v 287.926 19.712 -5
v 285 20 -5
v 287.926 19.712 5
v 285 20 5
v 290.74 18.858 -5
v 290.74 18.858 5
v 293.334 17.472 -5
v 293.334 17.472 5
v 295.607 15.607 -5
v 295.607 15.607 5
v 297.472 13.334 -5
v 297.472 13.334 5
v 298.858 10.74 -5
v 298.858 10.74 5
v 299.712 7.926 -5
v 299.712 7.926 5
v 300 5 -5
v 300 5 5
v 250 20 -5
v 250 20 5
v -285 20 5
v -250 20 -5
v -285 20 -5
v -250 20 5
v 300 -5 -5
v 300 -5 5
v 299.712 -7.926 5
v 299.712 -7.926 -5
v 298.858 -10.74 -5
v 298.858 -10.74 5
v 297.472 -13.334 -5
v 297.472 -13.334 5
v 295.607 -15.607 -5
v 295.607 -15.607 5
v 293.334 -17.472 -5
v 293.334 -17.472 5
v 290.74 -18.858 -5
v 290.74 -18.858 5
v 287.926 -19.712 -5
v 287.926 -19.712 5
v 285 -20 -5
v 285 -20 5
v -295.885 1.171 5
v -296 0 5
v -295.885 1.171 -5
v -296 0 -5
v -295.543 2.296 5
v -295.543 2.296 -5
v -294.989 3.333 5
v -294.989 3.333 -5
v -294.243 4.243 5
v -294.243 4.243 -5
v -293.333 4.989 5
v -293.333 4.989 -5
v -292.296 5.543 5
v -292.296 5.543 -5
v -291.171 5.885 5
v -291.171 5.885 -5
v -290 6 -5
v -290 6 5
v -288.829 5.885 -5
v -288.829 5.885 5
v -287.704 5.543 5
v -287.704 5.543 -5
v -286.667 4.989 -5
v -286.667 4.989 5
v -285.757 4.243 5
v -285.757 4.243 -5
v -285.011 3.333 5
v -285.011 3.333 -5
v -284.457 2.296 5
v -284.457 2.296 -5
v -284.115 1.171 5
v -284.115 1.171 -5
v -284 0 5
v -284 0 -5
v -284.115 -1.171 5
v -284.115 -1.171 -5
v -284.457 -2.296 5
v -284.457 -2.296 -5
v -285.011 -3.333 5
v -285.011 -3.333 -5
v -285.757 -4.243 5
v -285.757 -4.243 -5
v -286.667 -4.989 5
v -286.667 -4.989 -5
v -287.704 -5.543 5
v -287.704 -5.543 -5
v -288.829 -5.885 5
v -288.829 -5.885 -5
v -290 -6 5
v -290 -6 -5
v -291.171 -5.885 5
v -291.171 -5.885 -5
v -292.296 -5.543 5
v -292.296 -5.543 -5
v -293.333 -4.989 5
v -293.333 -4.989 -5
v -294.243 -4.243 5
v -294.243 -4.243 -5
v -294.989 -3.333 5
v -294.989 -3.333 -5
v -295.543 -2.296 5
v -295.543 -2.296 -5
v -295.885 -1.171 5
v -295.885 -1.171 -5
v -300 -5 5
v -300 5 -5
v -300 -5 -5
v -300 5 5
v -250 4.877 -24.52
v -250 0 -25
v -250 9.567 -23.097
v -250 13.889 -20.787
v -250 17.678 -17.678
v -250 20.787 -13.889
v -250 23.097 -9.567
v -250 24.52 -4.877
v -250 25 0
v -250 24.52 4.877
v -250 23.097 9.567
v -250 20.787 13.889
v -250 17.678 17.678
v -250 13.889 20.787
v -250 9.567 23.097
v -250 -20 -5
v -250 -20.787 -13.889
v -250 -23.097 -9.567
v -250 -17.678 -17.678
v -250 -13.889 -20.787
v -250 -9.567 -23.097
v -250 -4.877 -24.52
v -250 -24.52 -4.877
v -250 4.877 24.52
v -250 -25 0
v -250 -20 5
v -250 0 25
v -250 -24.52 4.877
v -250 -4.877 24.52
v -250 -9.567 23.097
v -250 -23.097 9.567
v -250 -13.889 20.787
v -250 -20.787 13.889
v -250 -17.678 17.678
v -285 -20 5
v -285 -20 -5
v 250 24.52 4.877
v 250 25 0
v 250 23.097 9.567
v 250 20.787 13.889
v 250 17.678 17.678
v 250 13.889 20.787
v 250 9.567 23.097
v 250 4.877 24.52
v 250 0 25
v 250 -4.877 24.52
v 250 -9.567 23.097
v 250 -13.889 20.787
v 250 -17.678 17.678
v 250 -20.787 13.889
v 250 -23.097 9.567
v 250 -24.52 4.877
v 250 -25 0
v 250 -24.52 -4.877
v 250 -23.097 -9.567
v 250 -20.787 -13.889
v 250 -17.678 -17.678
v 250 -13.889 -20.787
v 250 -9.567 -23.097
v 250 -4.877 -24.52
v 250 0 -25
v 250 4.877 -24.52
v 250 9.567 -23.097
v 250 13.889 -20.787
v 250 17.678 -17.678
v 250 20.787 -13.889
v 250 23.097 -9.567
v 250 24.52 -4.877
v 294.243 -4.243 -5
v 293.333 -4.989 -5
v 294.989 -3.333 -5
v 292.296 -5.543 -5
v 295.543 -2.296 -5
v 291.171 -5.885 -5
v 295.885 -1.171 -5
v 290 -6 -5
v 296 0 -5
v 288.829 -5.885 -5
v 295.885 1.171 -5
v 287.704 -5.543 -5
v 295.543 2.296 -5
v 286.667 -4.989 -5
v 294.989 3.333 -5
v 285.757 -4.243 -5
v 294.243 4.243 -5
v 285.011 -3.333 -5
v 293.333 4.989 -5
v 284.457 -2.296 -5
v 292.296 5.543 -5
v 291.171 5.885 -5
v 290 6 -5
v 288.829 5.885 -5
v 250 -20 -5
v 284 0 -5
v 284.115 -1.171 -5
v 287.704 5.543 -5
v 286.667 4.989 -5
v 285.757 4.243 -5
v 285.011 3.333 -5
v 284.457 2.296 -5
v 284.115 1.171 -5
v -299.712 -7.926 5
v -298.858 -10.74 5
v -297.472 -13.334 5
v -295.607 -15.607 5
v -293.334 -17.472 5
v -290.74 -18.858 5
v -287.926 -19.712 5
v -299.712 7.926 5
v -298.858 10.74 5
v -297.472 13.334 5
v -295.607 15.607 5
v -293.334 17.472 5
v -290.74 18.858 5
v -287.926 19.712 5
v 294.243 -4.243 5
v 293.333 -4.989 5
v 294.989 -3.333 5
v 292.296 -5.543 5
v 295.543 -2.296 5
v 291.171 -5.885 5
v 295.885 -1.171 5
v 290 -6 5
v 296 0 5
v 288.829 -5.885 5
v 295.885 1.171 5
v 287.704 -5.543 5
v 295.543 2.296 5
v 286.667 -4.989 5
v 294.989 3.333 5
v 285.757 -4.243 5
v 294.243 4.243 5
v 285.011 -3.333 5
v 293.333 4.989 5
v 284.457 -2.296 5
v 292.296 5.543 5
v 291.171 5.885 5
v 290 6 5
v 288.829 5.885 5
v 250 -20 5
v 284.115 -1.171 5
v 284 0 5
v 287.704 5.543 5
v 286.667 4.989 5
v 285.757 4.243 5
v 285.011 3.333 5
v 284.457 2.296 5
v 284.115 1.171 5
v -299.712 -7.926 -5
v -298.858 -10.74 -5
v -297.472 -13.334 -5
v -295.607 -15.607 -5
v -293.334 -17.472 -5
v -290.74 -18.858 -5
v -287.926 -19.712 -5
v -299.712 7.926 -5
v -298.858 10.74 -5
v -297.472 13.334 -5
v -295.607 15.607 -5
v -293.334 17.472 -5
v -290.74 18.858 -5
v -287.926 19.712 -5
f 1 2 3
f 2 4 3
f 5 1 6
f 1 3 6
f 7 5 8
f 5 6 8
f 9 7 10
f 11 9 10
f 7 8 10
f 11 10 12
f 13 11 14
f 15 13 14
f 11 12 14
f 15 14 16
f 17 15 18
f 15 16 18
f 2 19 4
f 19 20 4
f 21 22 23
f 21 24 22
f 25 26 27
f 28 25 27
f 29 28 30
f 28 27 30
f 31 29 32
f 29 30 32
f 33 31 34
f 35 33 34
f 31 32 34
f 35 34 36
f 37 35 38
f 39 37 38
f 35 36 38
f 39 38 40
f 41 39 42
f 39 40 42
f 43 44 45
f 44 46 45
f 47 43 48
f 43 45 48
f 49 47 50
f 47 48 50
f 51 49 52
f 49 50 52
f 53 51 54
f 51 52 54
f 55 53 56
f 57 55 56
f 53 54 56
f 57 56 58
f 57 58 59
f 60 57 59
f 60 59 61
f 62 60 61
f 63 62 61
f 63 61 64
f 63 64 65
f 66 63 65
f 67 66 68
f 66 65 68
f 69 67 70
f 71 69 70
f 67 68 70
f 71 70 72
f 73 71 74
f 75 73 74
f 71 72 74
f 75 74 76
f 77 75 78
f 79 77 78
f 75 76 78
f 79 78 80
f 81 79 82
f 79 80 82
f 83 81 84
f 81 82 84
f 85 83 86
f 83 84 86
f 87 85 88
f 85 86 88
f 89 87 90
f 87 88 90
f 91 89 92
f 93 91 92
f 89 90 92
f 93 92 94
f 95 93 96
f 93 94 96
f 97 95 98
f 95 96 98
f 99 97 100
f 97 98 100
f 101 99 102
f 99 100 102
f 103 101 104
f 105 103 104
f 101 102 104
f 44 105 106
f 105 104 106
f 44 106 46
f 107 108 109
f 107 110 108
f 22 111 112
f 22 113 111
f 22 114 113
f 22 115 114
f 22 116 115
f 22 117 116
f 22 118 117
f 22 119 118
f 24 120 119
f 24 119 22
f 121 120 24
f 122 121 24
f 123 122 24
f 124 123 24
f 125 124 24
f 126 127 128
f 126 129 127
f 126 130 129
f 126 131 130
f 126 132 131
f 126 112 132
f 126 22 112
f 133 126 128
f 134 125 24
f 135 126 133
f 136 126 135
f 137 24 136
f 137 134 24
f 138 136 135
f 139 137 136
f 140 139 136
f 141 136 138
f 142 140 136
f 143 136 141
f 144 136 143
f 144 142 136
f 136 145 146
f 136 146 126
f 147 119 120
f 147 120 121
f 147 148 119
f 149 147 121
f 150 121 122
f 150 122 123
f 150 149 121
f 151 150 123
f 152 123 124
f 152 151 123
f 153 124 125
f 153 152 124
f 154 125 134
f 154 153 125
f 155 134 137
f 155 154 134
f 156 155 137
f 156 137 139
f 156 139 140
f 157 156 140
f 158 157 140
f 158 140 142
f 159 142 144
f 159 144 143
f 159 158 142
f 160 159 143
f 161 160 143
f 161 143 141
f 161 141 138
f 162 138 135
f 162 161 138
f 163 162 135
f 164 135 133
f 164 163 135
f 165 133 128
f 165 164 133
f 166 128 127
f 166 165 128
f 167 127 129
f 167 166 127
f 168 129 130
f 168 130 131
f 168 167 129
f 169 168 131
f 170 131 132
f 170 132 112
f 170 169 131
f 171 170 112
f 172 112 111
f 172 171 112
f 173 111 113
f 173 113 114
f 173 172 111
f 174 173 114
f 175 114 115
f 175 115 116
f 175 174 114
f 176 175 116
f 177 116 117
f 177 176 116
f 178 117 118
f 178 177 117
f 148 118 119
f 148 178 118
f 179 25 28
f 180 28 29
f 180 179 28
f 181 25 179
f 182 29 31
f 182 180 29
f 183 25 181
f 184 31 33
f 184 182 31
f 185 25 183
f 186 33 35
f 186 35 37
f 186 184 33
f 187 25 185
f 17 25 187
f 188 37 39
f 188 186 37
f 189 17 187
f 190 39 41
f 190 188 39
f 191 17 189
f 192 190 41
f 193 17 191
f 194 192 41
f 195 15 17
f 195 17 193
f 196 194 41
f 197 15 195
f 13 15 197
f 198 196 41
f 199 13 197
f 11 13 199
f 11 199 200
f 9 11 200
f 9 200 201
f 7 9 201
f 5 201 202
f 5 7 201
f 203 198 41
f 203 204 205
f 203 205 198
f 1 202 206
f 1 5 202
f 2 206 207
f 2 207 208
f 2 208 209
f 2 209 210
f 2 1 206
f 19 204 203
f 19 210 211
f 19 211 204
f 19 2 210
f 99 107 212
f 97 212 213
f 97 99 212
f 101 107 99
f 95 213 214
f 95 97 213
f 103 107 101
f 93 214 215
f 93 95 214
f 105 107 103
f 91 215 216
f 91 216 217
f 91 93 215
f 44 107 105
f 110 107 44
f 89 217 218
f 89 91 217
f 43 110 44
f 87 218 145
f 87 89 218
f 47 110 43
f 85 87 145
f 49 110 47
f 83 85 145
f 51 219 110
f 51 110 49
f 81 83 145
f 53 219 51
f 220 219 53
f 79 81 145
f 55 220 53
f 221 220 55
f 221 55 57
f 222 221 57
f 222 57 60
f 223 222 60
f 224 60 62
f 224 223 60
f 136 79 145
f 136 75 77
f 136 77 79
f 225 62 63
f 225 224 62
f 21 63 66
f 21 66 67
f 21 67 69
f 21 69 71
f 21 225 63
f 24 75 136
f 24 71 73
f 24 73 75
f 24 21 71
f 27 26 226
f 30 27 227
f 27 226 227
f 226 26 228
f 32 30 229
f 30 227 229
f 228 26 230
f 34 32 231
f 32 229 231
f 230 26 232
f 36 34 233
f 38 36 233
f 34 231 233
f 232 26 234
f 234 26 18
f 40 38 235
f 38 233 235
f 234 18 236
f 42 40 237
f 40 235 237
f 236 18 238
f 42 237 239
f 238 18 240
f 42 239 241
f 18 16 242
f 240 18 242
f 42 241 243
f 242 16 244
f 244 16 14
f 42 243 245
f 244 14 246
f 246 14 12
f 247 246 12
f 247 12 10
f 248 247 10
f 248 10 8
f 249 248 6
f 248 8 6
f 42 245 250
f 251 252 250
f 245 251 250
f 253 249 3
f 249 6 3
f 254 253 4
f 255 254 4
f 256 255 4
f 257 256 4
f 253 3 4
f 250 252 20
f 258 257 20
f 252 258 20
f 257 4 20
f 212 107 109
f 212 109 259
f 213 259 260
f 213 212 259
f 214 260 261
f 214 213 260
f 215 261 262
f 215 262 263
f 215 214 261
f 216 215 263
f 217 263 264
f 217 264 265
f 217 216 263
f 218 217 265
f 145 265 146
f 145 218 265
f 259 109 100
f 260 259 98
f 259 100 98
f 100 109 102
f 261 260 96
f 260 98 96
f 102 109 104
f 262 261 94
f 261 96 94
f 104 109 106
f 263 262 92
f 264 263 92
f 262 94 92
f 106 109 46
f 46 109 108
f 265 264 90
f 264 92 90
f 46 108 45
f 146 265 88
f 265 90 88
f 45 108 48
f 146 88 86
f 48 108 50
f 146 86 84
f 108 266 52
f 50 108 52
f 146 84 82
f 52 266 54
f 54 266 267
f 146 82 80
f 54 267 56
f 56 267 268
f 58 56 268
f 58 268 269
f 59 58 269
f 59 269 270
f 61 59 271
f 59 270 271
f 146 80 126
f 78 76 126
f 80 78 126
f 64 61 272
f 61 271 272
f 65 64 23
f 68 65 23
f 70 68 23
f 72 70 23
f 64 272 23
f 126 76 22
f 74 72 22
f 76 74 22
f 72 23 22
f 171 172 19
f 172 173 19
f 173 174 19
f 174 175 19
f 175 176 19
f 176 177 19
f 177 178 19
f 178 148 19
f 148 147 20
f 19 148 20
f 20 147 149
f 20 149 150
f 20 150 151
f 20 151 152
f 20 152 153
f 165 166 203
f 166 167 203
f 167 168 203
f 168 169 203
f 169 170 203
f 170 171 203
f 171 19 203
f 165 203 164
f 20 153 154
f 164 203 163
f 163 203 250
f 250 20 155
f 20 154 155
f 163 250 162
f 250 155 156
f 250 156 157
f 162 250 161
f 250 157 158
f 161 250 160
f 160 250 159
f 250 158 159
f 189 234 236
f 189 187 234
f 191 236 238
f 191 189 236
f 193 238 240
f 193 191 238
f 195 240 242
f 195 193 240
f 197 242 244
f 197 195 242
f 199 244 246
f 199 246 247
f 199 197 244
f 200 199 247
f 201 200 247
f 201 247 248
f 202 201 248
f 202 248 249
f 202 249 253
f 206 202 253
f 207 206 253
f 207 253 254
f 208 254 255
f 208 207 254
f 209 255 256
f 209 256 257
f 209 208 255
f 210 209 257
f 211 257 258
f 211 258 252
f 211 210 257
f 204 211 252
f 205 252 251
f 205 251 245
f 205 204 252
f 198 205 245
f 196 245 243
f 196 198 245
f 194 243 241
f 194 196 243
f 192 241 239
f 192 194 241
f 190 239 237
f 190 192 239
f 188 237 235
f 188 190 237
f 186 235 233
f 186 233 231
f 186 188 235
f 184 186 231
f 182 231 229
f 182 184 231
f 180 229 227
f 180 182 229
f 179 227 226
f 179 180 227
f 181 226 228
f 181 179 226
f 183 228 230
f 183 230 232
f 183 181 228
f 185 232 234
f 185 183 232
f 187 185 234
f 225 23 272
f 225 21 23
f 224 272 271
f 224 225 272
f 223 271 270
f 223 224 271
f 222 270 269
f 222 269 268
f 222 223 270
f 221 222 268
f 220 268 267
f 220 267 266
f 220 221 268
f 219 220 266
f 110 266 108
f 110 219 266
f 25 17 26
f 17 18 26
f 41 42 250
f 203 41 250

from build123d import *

# Parameters (mm, degrees)
ESBO_O1_W                = 500
ESBO_O1_H                = 25
ESBO_O2_R                = 6
RESSALTO_EXTRUS_O1_DEPTH = 5


with BuildPart() as part:
    # Esboço1 → Revolução1 (revolve)
    with BuildSketch(Plane.XY):
        with Locations((0, 12.5)):
            Rectangle(ESBO_O1_W, ESBO_O1_H)
    revolve(axis=Axis((0, 0, 0), (1, 0, 0)))

    # Esboço2 → Ressalto-extrusão1 (add, symmetric)
    with BuildSketch(Plane.XY):
        with BuildLine():
            Line((250, -20), (250, 20))
            Line((250, 20), (285, 20))
            ThreePointArc((285, 20), (295.606601718, 15.606601718), (300, 5))
            Line((300, 5), (300, -5))
            ThreePointArc((300, -5), (295.606601718, -15.606601718), (285, -20))
            Line((285, -20), (250, -20))
        make_face()
        with Locations((290, 0)):
            Circle(ESBO_O2_R, mode=Mode.SUBTRACT)
    ressalto_extrus_o1 = extrude(amount=RESSALTO_EXTRUS_O1_DEPTH, both=True)

    # Espelhar1: Ressalto-extrusão1 across plane
    add(ressalto_extrus_o1.mirror(Plane(origin=(0, 0, 0), x_dir=(0, 0, 1), z_dir=(1, 0, 0))))


solid = part.part
